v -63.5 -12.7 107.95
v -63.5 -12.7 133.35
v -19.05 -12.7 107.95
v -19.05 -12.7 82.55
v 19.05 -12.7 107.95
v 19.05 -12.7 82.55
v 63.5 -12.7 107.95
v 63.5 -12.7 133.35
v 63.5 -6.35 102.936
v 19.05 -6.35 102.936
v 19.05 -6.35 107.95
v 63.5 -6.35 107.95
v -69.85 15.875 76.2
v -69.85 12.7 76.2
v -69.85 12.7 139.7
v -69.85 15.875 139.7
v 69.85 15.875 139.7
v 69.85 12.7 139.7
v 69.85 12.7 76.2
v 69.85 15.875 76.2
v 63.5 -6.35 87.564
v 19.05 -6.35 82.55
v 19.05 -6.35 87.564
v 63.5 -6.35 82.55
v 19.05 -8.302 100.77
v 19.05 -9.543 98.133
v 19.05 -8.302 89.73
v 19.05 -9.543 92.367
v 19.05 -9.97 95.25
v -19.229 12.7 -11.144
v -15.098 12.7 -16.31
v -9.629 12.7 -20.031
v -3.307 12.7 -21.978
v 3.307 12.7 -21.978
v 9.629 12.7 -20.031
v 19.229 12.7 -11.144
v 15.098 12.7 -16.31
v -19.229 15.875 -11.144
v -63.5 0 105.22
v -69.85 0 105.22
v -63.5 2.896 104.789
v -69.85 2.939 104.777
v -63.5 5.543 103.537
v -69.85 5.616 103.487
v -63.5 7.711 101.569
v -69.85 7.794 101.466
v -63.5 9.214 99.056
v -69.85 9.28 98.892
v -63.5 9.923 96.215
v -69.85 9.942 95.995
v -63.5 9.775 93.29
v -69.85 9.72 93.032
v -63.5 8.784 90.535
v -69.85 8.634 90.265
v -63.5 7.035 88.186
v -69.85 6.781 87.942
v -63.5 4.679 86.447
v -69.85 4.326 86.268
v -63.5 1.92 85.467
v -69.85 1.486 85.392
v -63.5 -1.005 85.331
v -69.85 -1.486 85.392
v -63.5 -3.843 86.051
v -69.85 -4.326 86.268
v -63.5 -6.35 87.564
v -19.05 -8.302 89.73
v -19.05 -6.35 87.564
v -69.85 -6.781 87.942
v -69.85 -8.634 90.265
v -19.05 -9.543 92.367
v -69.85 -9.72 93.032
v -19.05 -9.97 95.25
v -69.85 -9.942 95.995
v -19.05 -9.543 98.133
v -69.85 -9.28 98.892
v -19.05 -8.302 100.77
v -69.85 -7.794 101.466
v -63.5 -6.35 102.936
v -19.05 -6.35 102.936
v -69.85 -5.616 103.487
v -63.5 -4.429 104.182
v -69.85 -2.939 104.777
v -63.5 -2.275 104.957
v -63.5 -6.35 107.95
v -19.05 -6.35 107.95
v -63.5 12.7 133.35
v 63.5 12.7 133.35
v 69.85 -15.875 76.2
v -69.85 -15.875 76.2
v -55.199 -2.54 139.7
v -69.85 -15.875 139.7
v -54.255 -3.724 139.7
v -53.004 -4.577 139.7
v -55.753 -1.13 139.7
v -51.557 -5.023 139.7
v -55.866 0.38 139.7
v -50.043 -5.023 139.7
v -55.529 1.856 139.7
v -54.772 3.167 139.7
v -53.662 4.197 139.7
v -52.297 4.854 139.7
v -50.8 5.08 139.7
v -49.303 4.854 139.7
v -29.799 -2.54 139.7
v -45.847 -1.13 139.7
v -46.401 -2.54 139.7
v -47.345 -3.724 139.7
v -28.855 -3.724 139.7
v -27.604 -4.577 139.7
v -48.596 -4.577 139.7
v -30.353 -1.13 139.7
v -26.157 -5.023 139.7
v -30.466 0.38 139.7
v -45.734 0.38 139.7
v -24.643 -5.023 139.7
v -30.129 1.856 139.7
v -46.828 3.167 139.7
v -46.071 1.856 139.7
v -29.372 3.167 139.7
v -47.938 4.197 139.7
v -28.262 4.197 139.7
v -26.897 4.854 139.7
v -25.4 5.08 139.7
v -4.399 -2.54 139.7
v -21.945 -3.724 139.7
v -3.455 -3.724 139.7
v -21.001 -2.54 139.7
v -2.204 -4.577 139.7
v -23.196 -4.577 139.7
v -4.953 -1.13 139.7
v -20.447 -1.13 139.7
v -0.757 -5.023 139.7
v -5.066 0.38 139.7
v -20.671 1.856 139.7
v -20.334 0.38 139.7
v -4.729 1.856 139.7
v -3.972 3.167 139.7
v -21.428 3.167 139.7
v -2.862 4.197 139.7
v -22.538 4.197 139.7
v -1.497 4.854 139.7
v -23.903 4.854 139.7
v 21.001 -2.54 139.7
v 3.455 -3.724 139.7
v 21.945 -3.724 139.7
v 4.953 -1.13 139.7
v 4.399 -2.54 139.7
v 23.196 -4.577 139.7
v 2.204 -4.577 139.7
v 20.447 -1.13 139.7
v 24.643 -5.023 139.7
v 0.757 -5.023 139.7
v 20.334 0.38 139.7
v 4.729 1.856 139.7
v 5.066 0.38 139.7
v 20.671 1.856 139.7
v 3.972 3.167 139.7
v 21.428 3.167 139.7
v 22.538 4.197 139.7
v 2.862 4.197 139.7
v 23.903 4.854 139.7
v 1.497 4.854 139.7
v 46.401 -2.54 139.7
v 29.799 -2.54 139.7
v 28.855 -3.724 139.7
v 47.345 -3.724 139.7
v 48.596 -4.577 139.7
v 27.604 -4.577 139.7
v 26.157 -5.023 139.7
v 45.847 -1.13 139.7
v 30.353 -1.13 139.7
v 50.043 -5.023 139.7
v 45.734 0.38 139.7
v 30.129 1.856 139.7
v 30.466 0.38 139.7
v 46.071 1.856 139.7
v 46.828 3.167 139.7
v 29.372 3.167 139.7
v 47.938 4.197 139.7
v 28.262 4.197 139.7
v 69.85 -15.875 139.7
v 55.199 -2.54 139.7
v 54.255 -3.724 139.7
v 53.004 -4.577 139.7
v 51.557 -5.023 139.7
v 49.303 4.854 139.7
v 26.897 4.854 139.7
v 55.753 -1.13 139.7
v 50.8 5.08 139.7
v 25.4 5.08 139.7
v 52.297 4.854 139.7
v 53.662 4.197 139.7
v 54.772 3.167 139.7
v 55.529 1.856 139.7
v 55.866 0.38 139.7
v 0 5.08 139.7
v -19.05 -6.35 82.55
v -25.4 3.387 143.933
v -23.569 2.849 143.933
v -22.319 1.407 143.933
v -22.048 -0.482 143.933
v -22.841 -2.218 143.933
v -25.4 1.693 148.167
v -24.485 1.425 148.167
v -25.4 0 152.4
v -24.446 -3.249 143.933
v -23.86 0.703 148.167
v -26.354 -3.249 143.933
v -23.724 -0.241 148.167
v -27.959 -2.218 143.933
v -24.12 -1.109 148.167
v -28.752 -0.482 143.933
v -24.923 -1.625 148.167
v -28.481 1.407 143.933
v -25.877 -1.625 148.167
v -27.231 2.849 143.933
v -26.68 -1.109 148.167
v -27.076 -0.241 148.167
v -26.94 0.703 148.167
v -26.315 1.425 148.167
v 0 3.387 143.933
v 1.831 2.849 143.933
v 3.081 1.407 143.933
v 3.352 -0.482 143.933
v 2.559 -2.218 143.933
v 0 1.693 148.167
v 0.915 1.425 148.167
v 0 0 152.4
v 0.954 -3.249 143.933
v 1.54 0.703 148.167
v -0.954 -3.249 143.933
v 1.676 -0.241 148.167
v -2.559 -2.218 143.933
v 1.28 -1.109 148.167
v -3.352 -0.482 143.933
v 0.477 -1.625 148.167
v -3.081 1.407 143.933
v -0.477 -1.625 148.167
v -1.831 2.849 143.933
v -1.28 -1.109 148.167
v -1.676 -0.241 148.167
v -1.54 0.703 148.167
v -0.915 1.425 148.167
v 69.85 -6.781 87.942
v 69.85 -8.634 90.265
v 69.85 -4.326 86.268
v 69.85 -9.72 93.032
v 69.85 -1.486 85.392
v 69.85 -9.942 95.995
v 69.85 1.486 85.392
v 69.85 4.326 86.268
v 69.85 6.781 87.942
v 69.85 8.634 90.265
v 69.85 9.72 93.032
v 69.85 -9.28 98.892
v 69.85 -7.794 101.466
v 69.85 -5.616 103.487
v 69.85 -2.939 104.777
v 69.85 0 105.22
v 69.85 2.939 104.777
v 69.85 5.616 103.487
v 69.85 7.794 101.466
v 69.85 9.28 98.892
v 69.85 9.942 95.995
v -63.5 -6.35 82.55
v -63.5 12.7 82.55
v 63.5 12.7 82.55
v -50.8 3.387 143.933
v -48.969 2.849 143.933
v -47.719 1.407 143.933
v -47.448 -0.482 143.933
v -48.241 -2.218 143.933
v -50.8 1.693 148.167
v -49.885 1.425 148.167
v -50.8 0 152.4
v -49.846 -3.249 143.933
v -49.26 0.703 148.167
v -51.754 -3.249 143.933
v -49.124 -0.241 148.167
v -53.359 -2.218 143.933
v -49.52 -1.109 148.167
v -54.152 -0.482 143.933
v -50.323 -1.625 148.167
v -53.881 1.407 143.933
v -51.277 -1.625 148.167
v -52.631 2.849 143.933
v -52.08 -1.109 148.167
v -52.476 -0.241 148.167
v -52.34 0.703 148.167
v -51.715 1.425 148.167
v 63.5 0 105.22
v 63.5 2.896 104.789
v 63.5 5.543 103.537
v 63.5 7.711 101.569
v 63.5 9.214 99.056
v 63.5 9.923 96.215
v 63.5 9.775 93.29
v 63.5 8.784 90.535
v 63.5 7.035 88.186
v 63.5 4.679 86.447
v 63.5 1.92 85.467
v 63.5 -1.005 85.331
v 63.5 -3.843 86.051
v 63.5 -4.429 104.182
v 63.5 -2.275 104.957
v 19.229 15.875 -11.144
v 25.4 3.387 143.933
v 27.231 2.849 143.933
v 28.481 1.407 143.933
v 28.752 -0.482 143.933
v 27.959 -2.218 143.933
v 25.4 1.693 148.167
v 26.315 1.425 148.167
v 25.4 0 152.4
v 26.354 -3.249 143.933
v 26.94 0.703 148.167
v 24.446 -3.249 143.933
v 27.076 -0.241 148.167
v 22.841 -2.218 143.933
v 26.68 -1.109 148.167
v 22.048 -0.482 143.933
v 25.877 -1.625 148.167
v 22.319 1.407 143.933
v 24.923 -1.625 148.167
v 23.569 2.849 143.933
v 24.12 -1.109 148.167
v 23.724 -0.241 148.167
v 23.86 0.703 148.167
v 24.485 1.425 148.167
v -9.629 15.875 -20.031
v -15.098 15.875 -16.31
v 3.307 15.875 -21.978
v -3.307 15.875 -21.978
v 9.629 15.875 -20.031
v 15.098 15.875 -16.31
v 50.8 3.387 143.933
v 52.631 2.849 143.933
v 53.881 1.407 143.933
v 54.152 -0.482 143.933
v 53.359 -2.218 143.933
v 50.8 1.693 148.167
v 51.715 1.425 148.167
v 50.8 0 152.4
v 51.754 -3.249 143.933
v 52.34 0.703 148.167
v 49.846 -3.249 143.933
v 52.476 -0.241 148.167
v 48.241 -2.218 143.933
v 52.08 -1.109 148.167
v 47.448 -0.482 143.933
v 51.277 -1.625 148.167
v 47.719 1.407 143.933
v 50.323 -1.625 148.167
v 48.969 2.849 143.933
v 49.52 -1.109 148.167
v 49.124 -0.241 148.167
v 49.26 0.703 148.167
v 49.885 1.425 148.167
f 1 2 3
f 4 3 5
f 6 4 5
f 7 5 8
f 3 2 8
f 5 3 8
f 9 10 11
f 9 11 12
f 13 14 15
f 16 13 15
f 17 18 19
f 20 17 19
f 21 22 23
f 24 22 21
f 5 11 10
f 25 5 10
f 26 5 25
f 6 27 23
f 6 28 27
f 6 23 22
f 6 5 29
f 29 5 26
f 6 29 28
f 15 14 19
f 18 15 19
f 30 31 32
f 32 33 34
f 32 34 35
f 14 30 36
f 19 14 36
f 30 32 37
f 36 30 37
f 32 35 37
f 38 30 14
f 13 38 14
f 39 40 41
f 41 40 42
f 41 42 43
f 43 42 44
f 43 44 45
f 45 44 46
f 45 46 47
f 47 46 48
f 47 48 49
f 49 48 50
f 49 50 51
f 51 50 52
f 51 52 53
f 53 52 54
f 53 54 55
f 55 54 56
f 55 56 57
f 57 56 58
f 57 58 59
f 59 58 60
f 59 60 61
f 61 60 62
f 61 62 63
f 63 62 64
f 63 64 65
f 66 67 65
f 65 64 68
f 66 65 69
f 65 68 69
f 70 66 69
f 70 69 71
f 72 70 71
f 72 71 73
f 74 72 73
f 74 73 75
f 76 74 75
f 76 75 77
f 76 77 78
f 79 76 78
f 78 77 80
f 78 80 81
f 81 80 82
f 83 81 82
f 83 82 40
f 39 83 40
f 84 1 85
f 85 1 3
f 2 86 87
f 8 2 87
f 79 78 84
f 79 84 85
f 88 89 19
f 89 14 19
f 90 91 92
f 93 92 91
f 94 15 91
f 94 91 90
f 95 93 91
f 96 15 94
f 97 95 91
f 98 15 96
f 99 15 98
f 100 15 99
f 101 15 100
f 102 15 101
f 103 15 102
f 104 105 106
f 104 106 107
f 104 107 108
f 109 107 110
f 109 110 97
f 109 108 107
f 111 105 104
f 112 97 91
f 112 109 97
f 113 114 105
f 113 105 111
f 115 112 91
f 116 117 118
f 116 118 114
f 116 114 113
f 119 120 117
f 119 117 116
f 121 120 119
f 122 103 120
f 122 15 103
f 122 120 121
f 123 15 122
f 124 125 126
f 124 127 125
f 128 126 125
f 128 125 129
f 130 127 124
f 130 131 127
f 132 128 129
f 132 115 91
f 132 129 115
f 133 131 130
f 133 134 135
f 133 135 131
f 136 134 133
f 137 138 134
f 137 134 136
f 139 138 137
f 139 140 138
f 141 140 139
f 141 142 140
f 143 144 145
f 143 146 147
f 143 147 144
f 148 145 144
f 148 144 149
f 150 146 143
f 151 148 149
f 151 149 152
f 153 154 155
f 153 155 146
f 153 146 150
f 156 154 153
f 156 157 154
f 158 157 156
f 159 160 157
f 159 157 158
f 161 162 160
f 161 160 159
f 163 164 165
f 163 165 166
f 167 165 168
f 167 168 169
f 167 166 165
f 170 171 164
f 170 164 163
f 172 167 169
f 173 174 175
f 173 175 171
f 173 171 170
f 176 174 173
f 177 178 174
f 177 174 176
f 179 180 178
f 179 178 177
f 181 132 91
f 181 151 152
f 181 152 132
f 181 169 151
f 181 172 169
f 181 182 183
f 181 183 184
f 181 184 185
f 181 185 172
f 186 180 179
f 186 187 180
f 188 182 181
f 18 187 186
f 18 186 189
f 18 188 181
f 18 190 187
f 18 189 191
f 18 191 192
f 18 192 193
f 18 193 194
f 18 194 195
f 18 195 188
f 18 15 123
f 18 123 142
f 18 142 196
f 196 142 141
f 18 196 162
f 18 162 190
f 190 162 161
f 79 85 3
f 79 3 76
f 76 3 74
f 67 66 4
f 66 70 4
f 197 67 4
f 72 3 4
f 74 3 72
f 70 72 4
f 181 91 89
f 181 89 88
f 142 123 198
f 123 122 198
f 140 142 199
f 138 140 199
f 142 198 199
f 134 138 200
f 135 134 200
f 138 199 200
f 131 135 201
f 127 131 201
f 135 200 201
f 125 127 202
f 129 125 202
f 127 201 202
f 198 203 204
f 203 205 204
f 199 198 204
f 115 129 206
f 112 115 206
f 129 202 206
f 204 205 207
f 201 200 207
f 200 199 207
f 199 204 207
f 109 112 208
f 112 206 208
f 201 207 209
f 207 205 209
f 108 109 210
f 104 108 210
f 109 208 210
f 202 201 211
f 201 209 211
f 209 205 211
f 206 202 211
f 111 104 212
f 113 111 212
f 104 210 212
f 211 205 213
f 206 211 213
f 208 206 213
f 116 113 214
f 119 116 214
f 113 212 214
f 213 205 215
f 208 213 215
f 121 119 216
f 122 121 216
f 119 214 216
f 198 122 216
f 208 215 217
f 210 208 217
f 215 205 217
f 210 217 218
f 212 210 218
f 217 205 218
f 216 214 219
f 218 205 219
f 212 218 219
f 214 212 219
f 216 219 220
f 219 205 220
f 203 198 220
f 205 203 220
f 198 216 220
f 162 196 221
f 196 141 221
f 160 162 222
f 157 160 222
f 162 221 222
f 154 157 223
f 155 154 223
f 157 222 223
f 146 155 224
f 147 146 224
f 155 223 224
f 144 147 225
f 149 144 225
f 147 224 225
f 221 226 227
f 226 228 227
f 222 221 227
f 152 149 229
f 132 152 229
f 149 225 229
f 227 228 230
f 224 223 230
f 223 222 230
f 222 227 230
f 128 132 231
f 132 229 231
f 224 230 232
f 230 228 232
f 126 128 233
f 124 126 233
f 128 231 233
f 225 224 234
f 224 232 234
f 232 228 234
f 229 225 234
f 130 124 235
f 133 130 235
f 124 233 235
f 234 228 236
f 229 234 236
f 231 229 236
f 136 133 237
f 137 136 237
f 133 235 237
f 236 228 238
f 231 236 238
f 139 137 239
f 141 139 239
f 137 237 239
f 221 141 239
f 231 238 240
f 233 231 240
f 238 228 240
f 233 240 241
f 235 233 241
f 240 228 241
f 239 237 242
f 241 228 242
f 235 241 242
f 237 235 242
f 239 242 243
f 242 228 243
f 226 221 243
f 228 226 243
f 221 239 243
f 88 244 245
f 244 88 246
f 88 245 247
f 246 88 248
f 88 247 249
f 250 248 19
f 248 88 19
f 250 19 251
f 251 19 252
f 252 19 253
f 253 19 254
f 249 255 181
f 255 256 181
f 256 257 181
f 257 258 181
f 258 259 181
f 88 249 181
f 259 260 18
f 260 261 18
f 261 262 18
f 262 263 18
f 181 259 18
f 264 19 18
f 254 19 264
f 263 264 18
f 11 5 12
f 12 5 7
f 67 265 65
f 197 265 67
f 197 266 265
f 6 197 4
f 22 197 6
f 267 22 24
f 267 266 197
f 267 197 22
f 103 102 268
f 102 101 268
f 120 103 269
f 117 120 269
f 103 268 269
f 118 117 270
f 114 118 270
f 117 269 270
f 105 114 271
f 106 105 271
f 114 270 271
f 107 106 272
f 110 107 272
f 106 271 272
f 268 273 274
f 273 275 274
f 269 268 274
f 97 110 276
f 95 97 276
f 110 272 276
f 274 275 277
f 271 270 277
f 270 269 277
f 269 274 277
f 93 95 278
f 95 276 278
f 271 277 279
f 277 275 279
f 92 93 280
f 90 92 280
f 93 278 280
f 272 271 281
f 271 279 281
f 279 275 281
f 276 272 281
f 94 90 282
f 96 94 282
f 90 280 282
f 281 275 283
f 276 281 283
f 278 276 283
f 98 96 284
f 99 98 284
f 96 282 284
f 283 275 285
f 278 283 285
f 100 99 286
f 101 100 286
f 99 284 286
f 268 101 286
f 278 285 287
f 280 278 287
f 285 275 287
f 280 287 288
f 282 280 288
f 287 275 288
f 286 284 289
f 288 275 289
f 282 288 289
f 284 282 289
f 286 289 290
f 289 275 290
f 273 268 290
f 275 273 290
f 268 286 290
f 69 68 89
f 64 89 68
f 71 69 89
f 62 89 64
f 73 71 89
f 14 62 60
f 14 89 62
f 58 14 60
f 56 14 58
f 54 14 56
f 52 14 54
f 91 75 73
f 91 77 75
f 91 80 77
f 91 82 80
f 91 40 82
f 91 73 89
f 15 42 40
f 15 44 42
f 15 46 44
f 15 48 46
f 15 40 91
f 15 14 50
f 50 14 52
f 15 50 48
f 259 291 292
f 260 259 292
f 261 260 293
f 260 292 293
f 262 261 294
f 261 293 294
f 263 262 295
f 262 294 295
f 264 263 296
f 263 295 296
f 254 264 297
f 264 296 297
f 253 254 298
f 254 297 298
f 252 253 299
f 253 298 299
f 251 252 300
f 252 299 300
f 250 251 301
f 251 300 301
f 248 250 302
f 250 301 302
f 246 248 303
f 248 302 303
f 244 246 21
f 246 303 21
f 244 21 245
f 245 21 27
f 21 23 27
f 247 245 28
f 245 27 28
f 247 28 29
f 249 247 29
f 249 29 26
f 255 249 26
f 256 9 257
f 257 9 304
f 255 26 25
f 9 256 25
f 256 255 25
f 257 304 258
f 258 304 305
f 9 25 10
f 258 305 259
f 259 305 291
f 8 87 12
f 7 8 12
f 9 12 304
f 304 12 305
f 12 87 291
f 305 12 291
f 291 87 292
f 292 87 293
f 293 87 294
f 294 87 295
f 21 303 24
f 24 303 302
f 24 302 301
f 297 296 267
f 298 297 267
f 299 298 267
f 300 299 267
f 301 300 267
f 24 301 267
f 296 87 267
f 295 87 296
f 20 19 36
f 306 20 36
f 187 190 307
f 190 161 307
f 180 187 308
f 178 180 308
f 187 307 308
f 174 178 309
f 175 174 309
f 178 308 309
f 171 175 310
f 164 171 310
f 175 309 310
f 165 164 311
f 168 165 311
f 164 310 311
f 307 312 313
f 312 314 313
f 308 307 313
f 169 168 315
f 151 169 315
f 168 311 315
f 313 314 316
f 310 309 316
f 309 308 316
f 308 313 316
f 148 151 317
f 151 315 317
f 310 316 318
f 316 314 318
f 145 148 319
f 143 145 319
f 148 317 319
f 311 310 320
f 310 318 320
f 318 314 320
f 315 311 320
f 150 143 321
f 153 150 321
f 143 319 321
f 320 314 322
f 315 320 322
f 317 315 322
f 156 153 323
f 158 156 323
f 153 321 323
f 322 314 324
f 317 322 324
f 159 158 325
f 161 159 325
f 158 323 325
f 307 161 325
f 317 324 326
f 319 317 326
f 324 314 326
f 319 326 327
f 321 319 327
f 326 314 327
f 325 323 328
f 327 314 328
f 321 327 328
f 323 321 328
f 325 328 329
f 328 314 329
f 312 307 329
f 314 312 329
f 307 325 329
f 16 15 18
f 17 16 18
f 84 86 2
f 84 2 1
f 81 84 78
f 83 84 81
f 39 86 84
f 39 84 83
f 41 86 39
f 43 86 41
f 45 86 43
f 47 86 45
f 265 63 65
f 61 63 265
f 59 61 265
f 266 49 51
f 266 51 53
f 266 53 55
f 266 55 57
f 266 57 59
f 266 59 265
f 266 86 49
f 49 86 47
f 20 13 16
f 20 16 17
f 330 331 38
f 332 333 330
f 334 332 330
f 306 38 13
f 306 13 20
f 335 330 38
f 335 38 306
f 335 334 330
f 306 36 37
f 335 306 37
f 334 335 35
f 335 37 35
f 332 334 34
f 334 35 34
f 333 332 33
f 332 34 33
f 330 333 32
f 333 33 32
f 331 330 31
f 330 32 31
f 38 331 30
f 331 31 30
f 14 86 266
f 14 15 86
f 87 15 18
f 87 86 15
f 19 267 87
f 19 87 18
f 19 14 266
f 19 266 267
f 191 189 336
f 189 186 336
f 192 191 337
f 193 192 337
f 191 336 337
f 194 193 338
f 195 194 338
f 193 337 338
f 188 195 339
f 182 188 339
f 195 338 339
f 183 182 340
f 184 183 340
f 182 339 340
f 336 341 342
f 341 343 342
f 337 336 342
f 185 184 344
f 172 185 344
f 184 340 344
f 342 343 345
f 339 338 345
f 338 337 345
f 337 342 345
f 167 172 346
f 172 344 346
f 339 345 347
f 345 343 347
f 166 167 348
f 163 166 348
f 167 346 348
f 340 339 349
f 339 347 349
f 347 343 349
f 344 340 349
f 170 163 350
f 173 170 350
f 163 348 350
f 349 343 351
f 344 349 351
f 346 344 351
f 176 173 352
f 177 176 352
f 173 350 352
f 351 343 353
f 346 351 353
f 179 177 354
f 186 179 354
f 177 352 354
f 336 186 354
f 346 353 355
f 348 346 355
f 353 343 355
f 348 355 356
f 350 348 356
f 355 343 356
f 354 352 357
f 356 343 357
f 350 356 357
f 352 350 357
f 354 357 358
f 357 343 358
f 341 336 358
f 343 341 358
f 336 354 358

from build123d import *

# Parameters (mm, degrees)
SKETCH3_W                = 139.7
SKETCH3_H                = 63.5
SKETCH3_W_2              = 127
SKETCH3_H_2              = 50.8
BOSS_EXTRUDE1_DEPTH      = 12.7
BOSS_EXTRUDE1_DEPTH_BACK = 12.7
SKETCH4_W                = 139.7
SKETCH4_H                = 63.5
BOSS_EXTRUDE2_DEPTH      = 3.175
BOSS_EXTRUDE3_DEPTH      = 3.175
SKETCH7_W                = 44.45
SKETCH7_H                = 25.4
BOSS_EXTRUDE4_DEPTH      = 6.35
SKETCH6_R                = 9.9695
CUT_EXTRUDE1_DEPTH       = 140.7
LPATTERN1_COUNT          = 3
LPATTERN1_PITCH          = 25.4
LPATTERN1_COL_COUNT      = 3
LPATTERN1_COL_PITCH      = 25.4


with BuildPart() as part:
    # Sketch3 → Boss-Extrude1 (new body, two sides)
    with BuildSketch(Plane(origin=(0, 0, 0), x_dir=(1, 0, 0), z_dir=(0, 1, 0))) as boss_extrude1_sk:
        with Locations((0, -107.95)):
            Rectangle(SKETCH3_W, SKETCH3_H)
        with Locations((0, -107.95)):
            Rectangle(SKETCH3_W_2, SKETCH3_H_2, mode=Mode.SUBTRACT)
    extrude(amount=BOSS_EXTRUDE1_DEPTH)
    extrude(boss_extrude1_sk.sketch, amount=-BOSS_EXTRUDE1_DEPTH_BACK)

    # Sketch4 → Boss-Extrude2 (add)
    with BuildSketch(Plane.XZ.offset(12.7)):
        with Locations((0, 107.95)):
            Rectangle(SKETCH4_W, SKETCH4_H)
    extrude(amount=BOSS_EXTRUDE2_DEPTH)

    # Sketch7 → Boss-Extrude4 (add)
    with BuildSketch(Plane(origin=(0, -12.7, 0), x_dir=(1, 0, 0), z_dir=(0, 1, 0))):
        with Locations((-41.275, -95.25)):
            Rectangle(SKETCH7_W, SKETCH7_H)
        with Locations((41.275, -95.25)):
            Rectangle(SKETCH7_W, SKETCH7_H)
    extrude(amount=BOSS_EXTRUDE4_DEPTH)

    # Sketch6 → Cut-Extrude1 (cut, through all)
    with BuildSketch(Plane.ZY.offset(69.85)):
        with Locations((95.25, 0)):
            Circle(SKETCH6_R)
    extrude(amount=-CUT_EXTRUDE1_DEPTH, mode=Mode.SUBTRACT)

    # Sketch9 → Revolve1 (revolve)
    with BuildSketch(Plane(origin=(0, 0, 0), x_dir=(0, 0, -1), z_dir=(1, 0, 0))):
        Polygon((-139.7, 0), (-139.7, 5.08), (-152.4, 0), align=None)
    revolve1 = revolve(axis=Axis((0, 0, 152.4), (0, 0, -1)))

    # LPattern1: Revolve1 ×3
    with Locations(*[(-i * LPATTERN1_PITCH, 0, 0) for i in range(1, LPATTERN1_COUNT)]):
        add(revolve1)

    # LPattern1 col: Revolve1 ×3
    with Locations(*[(i * LPATTERN1_COL_PITCH, 0, 0) for i in range(1, LPATTERN1_COL_COUNT)]):
        add(revolve1)


with BuildPart() as body_2:
    # Sketch5 → Boss-Extrude3 (new body)
    with BuildSketch(Plane(origin=(0, 12.7, 0), x_dir=(1, 0, 0), z_dir=(0, 1, 0))):
        with BuildLine():
            Line((-19.229016085, 11.144306411), (-69.85, -76.2))
            Line((-69.85, -76.2), (-69.85, -139.7))
            Line((-69.85, -139.7), (69.85, -139.7))
            Line((69.85, -139.7), (69.85, -76.2))
            Line((69.85, -76.2), (19.229016085, 11.144306411))
            ThreePointArc((19.229016085, 11.144306411), (0, 22.225), (-19.229016085, 11.144306411))
        make_face()
    extrude(amount=BOSS_EXTRUDE3_DEPTH)


solid = Compound([part.part, body_2.part])
